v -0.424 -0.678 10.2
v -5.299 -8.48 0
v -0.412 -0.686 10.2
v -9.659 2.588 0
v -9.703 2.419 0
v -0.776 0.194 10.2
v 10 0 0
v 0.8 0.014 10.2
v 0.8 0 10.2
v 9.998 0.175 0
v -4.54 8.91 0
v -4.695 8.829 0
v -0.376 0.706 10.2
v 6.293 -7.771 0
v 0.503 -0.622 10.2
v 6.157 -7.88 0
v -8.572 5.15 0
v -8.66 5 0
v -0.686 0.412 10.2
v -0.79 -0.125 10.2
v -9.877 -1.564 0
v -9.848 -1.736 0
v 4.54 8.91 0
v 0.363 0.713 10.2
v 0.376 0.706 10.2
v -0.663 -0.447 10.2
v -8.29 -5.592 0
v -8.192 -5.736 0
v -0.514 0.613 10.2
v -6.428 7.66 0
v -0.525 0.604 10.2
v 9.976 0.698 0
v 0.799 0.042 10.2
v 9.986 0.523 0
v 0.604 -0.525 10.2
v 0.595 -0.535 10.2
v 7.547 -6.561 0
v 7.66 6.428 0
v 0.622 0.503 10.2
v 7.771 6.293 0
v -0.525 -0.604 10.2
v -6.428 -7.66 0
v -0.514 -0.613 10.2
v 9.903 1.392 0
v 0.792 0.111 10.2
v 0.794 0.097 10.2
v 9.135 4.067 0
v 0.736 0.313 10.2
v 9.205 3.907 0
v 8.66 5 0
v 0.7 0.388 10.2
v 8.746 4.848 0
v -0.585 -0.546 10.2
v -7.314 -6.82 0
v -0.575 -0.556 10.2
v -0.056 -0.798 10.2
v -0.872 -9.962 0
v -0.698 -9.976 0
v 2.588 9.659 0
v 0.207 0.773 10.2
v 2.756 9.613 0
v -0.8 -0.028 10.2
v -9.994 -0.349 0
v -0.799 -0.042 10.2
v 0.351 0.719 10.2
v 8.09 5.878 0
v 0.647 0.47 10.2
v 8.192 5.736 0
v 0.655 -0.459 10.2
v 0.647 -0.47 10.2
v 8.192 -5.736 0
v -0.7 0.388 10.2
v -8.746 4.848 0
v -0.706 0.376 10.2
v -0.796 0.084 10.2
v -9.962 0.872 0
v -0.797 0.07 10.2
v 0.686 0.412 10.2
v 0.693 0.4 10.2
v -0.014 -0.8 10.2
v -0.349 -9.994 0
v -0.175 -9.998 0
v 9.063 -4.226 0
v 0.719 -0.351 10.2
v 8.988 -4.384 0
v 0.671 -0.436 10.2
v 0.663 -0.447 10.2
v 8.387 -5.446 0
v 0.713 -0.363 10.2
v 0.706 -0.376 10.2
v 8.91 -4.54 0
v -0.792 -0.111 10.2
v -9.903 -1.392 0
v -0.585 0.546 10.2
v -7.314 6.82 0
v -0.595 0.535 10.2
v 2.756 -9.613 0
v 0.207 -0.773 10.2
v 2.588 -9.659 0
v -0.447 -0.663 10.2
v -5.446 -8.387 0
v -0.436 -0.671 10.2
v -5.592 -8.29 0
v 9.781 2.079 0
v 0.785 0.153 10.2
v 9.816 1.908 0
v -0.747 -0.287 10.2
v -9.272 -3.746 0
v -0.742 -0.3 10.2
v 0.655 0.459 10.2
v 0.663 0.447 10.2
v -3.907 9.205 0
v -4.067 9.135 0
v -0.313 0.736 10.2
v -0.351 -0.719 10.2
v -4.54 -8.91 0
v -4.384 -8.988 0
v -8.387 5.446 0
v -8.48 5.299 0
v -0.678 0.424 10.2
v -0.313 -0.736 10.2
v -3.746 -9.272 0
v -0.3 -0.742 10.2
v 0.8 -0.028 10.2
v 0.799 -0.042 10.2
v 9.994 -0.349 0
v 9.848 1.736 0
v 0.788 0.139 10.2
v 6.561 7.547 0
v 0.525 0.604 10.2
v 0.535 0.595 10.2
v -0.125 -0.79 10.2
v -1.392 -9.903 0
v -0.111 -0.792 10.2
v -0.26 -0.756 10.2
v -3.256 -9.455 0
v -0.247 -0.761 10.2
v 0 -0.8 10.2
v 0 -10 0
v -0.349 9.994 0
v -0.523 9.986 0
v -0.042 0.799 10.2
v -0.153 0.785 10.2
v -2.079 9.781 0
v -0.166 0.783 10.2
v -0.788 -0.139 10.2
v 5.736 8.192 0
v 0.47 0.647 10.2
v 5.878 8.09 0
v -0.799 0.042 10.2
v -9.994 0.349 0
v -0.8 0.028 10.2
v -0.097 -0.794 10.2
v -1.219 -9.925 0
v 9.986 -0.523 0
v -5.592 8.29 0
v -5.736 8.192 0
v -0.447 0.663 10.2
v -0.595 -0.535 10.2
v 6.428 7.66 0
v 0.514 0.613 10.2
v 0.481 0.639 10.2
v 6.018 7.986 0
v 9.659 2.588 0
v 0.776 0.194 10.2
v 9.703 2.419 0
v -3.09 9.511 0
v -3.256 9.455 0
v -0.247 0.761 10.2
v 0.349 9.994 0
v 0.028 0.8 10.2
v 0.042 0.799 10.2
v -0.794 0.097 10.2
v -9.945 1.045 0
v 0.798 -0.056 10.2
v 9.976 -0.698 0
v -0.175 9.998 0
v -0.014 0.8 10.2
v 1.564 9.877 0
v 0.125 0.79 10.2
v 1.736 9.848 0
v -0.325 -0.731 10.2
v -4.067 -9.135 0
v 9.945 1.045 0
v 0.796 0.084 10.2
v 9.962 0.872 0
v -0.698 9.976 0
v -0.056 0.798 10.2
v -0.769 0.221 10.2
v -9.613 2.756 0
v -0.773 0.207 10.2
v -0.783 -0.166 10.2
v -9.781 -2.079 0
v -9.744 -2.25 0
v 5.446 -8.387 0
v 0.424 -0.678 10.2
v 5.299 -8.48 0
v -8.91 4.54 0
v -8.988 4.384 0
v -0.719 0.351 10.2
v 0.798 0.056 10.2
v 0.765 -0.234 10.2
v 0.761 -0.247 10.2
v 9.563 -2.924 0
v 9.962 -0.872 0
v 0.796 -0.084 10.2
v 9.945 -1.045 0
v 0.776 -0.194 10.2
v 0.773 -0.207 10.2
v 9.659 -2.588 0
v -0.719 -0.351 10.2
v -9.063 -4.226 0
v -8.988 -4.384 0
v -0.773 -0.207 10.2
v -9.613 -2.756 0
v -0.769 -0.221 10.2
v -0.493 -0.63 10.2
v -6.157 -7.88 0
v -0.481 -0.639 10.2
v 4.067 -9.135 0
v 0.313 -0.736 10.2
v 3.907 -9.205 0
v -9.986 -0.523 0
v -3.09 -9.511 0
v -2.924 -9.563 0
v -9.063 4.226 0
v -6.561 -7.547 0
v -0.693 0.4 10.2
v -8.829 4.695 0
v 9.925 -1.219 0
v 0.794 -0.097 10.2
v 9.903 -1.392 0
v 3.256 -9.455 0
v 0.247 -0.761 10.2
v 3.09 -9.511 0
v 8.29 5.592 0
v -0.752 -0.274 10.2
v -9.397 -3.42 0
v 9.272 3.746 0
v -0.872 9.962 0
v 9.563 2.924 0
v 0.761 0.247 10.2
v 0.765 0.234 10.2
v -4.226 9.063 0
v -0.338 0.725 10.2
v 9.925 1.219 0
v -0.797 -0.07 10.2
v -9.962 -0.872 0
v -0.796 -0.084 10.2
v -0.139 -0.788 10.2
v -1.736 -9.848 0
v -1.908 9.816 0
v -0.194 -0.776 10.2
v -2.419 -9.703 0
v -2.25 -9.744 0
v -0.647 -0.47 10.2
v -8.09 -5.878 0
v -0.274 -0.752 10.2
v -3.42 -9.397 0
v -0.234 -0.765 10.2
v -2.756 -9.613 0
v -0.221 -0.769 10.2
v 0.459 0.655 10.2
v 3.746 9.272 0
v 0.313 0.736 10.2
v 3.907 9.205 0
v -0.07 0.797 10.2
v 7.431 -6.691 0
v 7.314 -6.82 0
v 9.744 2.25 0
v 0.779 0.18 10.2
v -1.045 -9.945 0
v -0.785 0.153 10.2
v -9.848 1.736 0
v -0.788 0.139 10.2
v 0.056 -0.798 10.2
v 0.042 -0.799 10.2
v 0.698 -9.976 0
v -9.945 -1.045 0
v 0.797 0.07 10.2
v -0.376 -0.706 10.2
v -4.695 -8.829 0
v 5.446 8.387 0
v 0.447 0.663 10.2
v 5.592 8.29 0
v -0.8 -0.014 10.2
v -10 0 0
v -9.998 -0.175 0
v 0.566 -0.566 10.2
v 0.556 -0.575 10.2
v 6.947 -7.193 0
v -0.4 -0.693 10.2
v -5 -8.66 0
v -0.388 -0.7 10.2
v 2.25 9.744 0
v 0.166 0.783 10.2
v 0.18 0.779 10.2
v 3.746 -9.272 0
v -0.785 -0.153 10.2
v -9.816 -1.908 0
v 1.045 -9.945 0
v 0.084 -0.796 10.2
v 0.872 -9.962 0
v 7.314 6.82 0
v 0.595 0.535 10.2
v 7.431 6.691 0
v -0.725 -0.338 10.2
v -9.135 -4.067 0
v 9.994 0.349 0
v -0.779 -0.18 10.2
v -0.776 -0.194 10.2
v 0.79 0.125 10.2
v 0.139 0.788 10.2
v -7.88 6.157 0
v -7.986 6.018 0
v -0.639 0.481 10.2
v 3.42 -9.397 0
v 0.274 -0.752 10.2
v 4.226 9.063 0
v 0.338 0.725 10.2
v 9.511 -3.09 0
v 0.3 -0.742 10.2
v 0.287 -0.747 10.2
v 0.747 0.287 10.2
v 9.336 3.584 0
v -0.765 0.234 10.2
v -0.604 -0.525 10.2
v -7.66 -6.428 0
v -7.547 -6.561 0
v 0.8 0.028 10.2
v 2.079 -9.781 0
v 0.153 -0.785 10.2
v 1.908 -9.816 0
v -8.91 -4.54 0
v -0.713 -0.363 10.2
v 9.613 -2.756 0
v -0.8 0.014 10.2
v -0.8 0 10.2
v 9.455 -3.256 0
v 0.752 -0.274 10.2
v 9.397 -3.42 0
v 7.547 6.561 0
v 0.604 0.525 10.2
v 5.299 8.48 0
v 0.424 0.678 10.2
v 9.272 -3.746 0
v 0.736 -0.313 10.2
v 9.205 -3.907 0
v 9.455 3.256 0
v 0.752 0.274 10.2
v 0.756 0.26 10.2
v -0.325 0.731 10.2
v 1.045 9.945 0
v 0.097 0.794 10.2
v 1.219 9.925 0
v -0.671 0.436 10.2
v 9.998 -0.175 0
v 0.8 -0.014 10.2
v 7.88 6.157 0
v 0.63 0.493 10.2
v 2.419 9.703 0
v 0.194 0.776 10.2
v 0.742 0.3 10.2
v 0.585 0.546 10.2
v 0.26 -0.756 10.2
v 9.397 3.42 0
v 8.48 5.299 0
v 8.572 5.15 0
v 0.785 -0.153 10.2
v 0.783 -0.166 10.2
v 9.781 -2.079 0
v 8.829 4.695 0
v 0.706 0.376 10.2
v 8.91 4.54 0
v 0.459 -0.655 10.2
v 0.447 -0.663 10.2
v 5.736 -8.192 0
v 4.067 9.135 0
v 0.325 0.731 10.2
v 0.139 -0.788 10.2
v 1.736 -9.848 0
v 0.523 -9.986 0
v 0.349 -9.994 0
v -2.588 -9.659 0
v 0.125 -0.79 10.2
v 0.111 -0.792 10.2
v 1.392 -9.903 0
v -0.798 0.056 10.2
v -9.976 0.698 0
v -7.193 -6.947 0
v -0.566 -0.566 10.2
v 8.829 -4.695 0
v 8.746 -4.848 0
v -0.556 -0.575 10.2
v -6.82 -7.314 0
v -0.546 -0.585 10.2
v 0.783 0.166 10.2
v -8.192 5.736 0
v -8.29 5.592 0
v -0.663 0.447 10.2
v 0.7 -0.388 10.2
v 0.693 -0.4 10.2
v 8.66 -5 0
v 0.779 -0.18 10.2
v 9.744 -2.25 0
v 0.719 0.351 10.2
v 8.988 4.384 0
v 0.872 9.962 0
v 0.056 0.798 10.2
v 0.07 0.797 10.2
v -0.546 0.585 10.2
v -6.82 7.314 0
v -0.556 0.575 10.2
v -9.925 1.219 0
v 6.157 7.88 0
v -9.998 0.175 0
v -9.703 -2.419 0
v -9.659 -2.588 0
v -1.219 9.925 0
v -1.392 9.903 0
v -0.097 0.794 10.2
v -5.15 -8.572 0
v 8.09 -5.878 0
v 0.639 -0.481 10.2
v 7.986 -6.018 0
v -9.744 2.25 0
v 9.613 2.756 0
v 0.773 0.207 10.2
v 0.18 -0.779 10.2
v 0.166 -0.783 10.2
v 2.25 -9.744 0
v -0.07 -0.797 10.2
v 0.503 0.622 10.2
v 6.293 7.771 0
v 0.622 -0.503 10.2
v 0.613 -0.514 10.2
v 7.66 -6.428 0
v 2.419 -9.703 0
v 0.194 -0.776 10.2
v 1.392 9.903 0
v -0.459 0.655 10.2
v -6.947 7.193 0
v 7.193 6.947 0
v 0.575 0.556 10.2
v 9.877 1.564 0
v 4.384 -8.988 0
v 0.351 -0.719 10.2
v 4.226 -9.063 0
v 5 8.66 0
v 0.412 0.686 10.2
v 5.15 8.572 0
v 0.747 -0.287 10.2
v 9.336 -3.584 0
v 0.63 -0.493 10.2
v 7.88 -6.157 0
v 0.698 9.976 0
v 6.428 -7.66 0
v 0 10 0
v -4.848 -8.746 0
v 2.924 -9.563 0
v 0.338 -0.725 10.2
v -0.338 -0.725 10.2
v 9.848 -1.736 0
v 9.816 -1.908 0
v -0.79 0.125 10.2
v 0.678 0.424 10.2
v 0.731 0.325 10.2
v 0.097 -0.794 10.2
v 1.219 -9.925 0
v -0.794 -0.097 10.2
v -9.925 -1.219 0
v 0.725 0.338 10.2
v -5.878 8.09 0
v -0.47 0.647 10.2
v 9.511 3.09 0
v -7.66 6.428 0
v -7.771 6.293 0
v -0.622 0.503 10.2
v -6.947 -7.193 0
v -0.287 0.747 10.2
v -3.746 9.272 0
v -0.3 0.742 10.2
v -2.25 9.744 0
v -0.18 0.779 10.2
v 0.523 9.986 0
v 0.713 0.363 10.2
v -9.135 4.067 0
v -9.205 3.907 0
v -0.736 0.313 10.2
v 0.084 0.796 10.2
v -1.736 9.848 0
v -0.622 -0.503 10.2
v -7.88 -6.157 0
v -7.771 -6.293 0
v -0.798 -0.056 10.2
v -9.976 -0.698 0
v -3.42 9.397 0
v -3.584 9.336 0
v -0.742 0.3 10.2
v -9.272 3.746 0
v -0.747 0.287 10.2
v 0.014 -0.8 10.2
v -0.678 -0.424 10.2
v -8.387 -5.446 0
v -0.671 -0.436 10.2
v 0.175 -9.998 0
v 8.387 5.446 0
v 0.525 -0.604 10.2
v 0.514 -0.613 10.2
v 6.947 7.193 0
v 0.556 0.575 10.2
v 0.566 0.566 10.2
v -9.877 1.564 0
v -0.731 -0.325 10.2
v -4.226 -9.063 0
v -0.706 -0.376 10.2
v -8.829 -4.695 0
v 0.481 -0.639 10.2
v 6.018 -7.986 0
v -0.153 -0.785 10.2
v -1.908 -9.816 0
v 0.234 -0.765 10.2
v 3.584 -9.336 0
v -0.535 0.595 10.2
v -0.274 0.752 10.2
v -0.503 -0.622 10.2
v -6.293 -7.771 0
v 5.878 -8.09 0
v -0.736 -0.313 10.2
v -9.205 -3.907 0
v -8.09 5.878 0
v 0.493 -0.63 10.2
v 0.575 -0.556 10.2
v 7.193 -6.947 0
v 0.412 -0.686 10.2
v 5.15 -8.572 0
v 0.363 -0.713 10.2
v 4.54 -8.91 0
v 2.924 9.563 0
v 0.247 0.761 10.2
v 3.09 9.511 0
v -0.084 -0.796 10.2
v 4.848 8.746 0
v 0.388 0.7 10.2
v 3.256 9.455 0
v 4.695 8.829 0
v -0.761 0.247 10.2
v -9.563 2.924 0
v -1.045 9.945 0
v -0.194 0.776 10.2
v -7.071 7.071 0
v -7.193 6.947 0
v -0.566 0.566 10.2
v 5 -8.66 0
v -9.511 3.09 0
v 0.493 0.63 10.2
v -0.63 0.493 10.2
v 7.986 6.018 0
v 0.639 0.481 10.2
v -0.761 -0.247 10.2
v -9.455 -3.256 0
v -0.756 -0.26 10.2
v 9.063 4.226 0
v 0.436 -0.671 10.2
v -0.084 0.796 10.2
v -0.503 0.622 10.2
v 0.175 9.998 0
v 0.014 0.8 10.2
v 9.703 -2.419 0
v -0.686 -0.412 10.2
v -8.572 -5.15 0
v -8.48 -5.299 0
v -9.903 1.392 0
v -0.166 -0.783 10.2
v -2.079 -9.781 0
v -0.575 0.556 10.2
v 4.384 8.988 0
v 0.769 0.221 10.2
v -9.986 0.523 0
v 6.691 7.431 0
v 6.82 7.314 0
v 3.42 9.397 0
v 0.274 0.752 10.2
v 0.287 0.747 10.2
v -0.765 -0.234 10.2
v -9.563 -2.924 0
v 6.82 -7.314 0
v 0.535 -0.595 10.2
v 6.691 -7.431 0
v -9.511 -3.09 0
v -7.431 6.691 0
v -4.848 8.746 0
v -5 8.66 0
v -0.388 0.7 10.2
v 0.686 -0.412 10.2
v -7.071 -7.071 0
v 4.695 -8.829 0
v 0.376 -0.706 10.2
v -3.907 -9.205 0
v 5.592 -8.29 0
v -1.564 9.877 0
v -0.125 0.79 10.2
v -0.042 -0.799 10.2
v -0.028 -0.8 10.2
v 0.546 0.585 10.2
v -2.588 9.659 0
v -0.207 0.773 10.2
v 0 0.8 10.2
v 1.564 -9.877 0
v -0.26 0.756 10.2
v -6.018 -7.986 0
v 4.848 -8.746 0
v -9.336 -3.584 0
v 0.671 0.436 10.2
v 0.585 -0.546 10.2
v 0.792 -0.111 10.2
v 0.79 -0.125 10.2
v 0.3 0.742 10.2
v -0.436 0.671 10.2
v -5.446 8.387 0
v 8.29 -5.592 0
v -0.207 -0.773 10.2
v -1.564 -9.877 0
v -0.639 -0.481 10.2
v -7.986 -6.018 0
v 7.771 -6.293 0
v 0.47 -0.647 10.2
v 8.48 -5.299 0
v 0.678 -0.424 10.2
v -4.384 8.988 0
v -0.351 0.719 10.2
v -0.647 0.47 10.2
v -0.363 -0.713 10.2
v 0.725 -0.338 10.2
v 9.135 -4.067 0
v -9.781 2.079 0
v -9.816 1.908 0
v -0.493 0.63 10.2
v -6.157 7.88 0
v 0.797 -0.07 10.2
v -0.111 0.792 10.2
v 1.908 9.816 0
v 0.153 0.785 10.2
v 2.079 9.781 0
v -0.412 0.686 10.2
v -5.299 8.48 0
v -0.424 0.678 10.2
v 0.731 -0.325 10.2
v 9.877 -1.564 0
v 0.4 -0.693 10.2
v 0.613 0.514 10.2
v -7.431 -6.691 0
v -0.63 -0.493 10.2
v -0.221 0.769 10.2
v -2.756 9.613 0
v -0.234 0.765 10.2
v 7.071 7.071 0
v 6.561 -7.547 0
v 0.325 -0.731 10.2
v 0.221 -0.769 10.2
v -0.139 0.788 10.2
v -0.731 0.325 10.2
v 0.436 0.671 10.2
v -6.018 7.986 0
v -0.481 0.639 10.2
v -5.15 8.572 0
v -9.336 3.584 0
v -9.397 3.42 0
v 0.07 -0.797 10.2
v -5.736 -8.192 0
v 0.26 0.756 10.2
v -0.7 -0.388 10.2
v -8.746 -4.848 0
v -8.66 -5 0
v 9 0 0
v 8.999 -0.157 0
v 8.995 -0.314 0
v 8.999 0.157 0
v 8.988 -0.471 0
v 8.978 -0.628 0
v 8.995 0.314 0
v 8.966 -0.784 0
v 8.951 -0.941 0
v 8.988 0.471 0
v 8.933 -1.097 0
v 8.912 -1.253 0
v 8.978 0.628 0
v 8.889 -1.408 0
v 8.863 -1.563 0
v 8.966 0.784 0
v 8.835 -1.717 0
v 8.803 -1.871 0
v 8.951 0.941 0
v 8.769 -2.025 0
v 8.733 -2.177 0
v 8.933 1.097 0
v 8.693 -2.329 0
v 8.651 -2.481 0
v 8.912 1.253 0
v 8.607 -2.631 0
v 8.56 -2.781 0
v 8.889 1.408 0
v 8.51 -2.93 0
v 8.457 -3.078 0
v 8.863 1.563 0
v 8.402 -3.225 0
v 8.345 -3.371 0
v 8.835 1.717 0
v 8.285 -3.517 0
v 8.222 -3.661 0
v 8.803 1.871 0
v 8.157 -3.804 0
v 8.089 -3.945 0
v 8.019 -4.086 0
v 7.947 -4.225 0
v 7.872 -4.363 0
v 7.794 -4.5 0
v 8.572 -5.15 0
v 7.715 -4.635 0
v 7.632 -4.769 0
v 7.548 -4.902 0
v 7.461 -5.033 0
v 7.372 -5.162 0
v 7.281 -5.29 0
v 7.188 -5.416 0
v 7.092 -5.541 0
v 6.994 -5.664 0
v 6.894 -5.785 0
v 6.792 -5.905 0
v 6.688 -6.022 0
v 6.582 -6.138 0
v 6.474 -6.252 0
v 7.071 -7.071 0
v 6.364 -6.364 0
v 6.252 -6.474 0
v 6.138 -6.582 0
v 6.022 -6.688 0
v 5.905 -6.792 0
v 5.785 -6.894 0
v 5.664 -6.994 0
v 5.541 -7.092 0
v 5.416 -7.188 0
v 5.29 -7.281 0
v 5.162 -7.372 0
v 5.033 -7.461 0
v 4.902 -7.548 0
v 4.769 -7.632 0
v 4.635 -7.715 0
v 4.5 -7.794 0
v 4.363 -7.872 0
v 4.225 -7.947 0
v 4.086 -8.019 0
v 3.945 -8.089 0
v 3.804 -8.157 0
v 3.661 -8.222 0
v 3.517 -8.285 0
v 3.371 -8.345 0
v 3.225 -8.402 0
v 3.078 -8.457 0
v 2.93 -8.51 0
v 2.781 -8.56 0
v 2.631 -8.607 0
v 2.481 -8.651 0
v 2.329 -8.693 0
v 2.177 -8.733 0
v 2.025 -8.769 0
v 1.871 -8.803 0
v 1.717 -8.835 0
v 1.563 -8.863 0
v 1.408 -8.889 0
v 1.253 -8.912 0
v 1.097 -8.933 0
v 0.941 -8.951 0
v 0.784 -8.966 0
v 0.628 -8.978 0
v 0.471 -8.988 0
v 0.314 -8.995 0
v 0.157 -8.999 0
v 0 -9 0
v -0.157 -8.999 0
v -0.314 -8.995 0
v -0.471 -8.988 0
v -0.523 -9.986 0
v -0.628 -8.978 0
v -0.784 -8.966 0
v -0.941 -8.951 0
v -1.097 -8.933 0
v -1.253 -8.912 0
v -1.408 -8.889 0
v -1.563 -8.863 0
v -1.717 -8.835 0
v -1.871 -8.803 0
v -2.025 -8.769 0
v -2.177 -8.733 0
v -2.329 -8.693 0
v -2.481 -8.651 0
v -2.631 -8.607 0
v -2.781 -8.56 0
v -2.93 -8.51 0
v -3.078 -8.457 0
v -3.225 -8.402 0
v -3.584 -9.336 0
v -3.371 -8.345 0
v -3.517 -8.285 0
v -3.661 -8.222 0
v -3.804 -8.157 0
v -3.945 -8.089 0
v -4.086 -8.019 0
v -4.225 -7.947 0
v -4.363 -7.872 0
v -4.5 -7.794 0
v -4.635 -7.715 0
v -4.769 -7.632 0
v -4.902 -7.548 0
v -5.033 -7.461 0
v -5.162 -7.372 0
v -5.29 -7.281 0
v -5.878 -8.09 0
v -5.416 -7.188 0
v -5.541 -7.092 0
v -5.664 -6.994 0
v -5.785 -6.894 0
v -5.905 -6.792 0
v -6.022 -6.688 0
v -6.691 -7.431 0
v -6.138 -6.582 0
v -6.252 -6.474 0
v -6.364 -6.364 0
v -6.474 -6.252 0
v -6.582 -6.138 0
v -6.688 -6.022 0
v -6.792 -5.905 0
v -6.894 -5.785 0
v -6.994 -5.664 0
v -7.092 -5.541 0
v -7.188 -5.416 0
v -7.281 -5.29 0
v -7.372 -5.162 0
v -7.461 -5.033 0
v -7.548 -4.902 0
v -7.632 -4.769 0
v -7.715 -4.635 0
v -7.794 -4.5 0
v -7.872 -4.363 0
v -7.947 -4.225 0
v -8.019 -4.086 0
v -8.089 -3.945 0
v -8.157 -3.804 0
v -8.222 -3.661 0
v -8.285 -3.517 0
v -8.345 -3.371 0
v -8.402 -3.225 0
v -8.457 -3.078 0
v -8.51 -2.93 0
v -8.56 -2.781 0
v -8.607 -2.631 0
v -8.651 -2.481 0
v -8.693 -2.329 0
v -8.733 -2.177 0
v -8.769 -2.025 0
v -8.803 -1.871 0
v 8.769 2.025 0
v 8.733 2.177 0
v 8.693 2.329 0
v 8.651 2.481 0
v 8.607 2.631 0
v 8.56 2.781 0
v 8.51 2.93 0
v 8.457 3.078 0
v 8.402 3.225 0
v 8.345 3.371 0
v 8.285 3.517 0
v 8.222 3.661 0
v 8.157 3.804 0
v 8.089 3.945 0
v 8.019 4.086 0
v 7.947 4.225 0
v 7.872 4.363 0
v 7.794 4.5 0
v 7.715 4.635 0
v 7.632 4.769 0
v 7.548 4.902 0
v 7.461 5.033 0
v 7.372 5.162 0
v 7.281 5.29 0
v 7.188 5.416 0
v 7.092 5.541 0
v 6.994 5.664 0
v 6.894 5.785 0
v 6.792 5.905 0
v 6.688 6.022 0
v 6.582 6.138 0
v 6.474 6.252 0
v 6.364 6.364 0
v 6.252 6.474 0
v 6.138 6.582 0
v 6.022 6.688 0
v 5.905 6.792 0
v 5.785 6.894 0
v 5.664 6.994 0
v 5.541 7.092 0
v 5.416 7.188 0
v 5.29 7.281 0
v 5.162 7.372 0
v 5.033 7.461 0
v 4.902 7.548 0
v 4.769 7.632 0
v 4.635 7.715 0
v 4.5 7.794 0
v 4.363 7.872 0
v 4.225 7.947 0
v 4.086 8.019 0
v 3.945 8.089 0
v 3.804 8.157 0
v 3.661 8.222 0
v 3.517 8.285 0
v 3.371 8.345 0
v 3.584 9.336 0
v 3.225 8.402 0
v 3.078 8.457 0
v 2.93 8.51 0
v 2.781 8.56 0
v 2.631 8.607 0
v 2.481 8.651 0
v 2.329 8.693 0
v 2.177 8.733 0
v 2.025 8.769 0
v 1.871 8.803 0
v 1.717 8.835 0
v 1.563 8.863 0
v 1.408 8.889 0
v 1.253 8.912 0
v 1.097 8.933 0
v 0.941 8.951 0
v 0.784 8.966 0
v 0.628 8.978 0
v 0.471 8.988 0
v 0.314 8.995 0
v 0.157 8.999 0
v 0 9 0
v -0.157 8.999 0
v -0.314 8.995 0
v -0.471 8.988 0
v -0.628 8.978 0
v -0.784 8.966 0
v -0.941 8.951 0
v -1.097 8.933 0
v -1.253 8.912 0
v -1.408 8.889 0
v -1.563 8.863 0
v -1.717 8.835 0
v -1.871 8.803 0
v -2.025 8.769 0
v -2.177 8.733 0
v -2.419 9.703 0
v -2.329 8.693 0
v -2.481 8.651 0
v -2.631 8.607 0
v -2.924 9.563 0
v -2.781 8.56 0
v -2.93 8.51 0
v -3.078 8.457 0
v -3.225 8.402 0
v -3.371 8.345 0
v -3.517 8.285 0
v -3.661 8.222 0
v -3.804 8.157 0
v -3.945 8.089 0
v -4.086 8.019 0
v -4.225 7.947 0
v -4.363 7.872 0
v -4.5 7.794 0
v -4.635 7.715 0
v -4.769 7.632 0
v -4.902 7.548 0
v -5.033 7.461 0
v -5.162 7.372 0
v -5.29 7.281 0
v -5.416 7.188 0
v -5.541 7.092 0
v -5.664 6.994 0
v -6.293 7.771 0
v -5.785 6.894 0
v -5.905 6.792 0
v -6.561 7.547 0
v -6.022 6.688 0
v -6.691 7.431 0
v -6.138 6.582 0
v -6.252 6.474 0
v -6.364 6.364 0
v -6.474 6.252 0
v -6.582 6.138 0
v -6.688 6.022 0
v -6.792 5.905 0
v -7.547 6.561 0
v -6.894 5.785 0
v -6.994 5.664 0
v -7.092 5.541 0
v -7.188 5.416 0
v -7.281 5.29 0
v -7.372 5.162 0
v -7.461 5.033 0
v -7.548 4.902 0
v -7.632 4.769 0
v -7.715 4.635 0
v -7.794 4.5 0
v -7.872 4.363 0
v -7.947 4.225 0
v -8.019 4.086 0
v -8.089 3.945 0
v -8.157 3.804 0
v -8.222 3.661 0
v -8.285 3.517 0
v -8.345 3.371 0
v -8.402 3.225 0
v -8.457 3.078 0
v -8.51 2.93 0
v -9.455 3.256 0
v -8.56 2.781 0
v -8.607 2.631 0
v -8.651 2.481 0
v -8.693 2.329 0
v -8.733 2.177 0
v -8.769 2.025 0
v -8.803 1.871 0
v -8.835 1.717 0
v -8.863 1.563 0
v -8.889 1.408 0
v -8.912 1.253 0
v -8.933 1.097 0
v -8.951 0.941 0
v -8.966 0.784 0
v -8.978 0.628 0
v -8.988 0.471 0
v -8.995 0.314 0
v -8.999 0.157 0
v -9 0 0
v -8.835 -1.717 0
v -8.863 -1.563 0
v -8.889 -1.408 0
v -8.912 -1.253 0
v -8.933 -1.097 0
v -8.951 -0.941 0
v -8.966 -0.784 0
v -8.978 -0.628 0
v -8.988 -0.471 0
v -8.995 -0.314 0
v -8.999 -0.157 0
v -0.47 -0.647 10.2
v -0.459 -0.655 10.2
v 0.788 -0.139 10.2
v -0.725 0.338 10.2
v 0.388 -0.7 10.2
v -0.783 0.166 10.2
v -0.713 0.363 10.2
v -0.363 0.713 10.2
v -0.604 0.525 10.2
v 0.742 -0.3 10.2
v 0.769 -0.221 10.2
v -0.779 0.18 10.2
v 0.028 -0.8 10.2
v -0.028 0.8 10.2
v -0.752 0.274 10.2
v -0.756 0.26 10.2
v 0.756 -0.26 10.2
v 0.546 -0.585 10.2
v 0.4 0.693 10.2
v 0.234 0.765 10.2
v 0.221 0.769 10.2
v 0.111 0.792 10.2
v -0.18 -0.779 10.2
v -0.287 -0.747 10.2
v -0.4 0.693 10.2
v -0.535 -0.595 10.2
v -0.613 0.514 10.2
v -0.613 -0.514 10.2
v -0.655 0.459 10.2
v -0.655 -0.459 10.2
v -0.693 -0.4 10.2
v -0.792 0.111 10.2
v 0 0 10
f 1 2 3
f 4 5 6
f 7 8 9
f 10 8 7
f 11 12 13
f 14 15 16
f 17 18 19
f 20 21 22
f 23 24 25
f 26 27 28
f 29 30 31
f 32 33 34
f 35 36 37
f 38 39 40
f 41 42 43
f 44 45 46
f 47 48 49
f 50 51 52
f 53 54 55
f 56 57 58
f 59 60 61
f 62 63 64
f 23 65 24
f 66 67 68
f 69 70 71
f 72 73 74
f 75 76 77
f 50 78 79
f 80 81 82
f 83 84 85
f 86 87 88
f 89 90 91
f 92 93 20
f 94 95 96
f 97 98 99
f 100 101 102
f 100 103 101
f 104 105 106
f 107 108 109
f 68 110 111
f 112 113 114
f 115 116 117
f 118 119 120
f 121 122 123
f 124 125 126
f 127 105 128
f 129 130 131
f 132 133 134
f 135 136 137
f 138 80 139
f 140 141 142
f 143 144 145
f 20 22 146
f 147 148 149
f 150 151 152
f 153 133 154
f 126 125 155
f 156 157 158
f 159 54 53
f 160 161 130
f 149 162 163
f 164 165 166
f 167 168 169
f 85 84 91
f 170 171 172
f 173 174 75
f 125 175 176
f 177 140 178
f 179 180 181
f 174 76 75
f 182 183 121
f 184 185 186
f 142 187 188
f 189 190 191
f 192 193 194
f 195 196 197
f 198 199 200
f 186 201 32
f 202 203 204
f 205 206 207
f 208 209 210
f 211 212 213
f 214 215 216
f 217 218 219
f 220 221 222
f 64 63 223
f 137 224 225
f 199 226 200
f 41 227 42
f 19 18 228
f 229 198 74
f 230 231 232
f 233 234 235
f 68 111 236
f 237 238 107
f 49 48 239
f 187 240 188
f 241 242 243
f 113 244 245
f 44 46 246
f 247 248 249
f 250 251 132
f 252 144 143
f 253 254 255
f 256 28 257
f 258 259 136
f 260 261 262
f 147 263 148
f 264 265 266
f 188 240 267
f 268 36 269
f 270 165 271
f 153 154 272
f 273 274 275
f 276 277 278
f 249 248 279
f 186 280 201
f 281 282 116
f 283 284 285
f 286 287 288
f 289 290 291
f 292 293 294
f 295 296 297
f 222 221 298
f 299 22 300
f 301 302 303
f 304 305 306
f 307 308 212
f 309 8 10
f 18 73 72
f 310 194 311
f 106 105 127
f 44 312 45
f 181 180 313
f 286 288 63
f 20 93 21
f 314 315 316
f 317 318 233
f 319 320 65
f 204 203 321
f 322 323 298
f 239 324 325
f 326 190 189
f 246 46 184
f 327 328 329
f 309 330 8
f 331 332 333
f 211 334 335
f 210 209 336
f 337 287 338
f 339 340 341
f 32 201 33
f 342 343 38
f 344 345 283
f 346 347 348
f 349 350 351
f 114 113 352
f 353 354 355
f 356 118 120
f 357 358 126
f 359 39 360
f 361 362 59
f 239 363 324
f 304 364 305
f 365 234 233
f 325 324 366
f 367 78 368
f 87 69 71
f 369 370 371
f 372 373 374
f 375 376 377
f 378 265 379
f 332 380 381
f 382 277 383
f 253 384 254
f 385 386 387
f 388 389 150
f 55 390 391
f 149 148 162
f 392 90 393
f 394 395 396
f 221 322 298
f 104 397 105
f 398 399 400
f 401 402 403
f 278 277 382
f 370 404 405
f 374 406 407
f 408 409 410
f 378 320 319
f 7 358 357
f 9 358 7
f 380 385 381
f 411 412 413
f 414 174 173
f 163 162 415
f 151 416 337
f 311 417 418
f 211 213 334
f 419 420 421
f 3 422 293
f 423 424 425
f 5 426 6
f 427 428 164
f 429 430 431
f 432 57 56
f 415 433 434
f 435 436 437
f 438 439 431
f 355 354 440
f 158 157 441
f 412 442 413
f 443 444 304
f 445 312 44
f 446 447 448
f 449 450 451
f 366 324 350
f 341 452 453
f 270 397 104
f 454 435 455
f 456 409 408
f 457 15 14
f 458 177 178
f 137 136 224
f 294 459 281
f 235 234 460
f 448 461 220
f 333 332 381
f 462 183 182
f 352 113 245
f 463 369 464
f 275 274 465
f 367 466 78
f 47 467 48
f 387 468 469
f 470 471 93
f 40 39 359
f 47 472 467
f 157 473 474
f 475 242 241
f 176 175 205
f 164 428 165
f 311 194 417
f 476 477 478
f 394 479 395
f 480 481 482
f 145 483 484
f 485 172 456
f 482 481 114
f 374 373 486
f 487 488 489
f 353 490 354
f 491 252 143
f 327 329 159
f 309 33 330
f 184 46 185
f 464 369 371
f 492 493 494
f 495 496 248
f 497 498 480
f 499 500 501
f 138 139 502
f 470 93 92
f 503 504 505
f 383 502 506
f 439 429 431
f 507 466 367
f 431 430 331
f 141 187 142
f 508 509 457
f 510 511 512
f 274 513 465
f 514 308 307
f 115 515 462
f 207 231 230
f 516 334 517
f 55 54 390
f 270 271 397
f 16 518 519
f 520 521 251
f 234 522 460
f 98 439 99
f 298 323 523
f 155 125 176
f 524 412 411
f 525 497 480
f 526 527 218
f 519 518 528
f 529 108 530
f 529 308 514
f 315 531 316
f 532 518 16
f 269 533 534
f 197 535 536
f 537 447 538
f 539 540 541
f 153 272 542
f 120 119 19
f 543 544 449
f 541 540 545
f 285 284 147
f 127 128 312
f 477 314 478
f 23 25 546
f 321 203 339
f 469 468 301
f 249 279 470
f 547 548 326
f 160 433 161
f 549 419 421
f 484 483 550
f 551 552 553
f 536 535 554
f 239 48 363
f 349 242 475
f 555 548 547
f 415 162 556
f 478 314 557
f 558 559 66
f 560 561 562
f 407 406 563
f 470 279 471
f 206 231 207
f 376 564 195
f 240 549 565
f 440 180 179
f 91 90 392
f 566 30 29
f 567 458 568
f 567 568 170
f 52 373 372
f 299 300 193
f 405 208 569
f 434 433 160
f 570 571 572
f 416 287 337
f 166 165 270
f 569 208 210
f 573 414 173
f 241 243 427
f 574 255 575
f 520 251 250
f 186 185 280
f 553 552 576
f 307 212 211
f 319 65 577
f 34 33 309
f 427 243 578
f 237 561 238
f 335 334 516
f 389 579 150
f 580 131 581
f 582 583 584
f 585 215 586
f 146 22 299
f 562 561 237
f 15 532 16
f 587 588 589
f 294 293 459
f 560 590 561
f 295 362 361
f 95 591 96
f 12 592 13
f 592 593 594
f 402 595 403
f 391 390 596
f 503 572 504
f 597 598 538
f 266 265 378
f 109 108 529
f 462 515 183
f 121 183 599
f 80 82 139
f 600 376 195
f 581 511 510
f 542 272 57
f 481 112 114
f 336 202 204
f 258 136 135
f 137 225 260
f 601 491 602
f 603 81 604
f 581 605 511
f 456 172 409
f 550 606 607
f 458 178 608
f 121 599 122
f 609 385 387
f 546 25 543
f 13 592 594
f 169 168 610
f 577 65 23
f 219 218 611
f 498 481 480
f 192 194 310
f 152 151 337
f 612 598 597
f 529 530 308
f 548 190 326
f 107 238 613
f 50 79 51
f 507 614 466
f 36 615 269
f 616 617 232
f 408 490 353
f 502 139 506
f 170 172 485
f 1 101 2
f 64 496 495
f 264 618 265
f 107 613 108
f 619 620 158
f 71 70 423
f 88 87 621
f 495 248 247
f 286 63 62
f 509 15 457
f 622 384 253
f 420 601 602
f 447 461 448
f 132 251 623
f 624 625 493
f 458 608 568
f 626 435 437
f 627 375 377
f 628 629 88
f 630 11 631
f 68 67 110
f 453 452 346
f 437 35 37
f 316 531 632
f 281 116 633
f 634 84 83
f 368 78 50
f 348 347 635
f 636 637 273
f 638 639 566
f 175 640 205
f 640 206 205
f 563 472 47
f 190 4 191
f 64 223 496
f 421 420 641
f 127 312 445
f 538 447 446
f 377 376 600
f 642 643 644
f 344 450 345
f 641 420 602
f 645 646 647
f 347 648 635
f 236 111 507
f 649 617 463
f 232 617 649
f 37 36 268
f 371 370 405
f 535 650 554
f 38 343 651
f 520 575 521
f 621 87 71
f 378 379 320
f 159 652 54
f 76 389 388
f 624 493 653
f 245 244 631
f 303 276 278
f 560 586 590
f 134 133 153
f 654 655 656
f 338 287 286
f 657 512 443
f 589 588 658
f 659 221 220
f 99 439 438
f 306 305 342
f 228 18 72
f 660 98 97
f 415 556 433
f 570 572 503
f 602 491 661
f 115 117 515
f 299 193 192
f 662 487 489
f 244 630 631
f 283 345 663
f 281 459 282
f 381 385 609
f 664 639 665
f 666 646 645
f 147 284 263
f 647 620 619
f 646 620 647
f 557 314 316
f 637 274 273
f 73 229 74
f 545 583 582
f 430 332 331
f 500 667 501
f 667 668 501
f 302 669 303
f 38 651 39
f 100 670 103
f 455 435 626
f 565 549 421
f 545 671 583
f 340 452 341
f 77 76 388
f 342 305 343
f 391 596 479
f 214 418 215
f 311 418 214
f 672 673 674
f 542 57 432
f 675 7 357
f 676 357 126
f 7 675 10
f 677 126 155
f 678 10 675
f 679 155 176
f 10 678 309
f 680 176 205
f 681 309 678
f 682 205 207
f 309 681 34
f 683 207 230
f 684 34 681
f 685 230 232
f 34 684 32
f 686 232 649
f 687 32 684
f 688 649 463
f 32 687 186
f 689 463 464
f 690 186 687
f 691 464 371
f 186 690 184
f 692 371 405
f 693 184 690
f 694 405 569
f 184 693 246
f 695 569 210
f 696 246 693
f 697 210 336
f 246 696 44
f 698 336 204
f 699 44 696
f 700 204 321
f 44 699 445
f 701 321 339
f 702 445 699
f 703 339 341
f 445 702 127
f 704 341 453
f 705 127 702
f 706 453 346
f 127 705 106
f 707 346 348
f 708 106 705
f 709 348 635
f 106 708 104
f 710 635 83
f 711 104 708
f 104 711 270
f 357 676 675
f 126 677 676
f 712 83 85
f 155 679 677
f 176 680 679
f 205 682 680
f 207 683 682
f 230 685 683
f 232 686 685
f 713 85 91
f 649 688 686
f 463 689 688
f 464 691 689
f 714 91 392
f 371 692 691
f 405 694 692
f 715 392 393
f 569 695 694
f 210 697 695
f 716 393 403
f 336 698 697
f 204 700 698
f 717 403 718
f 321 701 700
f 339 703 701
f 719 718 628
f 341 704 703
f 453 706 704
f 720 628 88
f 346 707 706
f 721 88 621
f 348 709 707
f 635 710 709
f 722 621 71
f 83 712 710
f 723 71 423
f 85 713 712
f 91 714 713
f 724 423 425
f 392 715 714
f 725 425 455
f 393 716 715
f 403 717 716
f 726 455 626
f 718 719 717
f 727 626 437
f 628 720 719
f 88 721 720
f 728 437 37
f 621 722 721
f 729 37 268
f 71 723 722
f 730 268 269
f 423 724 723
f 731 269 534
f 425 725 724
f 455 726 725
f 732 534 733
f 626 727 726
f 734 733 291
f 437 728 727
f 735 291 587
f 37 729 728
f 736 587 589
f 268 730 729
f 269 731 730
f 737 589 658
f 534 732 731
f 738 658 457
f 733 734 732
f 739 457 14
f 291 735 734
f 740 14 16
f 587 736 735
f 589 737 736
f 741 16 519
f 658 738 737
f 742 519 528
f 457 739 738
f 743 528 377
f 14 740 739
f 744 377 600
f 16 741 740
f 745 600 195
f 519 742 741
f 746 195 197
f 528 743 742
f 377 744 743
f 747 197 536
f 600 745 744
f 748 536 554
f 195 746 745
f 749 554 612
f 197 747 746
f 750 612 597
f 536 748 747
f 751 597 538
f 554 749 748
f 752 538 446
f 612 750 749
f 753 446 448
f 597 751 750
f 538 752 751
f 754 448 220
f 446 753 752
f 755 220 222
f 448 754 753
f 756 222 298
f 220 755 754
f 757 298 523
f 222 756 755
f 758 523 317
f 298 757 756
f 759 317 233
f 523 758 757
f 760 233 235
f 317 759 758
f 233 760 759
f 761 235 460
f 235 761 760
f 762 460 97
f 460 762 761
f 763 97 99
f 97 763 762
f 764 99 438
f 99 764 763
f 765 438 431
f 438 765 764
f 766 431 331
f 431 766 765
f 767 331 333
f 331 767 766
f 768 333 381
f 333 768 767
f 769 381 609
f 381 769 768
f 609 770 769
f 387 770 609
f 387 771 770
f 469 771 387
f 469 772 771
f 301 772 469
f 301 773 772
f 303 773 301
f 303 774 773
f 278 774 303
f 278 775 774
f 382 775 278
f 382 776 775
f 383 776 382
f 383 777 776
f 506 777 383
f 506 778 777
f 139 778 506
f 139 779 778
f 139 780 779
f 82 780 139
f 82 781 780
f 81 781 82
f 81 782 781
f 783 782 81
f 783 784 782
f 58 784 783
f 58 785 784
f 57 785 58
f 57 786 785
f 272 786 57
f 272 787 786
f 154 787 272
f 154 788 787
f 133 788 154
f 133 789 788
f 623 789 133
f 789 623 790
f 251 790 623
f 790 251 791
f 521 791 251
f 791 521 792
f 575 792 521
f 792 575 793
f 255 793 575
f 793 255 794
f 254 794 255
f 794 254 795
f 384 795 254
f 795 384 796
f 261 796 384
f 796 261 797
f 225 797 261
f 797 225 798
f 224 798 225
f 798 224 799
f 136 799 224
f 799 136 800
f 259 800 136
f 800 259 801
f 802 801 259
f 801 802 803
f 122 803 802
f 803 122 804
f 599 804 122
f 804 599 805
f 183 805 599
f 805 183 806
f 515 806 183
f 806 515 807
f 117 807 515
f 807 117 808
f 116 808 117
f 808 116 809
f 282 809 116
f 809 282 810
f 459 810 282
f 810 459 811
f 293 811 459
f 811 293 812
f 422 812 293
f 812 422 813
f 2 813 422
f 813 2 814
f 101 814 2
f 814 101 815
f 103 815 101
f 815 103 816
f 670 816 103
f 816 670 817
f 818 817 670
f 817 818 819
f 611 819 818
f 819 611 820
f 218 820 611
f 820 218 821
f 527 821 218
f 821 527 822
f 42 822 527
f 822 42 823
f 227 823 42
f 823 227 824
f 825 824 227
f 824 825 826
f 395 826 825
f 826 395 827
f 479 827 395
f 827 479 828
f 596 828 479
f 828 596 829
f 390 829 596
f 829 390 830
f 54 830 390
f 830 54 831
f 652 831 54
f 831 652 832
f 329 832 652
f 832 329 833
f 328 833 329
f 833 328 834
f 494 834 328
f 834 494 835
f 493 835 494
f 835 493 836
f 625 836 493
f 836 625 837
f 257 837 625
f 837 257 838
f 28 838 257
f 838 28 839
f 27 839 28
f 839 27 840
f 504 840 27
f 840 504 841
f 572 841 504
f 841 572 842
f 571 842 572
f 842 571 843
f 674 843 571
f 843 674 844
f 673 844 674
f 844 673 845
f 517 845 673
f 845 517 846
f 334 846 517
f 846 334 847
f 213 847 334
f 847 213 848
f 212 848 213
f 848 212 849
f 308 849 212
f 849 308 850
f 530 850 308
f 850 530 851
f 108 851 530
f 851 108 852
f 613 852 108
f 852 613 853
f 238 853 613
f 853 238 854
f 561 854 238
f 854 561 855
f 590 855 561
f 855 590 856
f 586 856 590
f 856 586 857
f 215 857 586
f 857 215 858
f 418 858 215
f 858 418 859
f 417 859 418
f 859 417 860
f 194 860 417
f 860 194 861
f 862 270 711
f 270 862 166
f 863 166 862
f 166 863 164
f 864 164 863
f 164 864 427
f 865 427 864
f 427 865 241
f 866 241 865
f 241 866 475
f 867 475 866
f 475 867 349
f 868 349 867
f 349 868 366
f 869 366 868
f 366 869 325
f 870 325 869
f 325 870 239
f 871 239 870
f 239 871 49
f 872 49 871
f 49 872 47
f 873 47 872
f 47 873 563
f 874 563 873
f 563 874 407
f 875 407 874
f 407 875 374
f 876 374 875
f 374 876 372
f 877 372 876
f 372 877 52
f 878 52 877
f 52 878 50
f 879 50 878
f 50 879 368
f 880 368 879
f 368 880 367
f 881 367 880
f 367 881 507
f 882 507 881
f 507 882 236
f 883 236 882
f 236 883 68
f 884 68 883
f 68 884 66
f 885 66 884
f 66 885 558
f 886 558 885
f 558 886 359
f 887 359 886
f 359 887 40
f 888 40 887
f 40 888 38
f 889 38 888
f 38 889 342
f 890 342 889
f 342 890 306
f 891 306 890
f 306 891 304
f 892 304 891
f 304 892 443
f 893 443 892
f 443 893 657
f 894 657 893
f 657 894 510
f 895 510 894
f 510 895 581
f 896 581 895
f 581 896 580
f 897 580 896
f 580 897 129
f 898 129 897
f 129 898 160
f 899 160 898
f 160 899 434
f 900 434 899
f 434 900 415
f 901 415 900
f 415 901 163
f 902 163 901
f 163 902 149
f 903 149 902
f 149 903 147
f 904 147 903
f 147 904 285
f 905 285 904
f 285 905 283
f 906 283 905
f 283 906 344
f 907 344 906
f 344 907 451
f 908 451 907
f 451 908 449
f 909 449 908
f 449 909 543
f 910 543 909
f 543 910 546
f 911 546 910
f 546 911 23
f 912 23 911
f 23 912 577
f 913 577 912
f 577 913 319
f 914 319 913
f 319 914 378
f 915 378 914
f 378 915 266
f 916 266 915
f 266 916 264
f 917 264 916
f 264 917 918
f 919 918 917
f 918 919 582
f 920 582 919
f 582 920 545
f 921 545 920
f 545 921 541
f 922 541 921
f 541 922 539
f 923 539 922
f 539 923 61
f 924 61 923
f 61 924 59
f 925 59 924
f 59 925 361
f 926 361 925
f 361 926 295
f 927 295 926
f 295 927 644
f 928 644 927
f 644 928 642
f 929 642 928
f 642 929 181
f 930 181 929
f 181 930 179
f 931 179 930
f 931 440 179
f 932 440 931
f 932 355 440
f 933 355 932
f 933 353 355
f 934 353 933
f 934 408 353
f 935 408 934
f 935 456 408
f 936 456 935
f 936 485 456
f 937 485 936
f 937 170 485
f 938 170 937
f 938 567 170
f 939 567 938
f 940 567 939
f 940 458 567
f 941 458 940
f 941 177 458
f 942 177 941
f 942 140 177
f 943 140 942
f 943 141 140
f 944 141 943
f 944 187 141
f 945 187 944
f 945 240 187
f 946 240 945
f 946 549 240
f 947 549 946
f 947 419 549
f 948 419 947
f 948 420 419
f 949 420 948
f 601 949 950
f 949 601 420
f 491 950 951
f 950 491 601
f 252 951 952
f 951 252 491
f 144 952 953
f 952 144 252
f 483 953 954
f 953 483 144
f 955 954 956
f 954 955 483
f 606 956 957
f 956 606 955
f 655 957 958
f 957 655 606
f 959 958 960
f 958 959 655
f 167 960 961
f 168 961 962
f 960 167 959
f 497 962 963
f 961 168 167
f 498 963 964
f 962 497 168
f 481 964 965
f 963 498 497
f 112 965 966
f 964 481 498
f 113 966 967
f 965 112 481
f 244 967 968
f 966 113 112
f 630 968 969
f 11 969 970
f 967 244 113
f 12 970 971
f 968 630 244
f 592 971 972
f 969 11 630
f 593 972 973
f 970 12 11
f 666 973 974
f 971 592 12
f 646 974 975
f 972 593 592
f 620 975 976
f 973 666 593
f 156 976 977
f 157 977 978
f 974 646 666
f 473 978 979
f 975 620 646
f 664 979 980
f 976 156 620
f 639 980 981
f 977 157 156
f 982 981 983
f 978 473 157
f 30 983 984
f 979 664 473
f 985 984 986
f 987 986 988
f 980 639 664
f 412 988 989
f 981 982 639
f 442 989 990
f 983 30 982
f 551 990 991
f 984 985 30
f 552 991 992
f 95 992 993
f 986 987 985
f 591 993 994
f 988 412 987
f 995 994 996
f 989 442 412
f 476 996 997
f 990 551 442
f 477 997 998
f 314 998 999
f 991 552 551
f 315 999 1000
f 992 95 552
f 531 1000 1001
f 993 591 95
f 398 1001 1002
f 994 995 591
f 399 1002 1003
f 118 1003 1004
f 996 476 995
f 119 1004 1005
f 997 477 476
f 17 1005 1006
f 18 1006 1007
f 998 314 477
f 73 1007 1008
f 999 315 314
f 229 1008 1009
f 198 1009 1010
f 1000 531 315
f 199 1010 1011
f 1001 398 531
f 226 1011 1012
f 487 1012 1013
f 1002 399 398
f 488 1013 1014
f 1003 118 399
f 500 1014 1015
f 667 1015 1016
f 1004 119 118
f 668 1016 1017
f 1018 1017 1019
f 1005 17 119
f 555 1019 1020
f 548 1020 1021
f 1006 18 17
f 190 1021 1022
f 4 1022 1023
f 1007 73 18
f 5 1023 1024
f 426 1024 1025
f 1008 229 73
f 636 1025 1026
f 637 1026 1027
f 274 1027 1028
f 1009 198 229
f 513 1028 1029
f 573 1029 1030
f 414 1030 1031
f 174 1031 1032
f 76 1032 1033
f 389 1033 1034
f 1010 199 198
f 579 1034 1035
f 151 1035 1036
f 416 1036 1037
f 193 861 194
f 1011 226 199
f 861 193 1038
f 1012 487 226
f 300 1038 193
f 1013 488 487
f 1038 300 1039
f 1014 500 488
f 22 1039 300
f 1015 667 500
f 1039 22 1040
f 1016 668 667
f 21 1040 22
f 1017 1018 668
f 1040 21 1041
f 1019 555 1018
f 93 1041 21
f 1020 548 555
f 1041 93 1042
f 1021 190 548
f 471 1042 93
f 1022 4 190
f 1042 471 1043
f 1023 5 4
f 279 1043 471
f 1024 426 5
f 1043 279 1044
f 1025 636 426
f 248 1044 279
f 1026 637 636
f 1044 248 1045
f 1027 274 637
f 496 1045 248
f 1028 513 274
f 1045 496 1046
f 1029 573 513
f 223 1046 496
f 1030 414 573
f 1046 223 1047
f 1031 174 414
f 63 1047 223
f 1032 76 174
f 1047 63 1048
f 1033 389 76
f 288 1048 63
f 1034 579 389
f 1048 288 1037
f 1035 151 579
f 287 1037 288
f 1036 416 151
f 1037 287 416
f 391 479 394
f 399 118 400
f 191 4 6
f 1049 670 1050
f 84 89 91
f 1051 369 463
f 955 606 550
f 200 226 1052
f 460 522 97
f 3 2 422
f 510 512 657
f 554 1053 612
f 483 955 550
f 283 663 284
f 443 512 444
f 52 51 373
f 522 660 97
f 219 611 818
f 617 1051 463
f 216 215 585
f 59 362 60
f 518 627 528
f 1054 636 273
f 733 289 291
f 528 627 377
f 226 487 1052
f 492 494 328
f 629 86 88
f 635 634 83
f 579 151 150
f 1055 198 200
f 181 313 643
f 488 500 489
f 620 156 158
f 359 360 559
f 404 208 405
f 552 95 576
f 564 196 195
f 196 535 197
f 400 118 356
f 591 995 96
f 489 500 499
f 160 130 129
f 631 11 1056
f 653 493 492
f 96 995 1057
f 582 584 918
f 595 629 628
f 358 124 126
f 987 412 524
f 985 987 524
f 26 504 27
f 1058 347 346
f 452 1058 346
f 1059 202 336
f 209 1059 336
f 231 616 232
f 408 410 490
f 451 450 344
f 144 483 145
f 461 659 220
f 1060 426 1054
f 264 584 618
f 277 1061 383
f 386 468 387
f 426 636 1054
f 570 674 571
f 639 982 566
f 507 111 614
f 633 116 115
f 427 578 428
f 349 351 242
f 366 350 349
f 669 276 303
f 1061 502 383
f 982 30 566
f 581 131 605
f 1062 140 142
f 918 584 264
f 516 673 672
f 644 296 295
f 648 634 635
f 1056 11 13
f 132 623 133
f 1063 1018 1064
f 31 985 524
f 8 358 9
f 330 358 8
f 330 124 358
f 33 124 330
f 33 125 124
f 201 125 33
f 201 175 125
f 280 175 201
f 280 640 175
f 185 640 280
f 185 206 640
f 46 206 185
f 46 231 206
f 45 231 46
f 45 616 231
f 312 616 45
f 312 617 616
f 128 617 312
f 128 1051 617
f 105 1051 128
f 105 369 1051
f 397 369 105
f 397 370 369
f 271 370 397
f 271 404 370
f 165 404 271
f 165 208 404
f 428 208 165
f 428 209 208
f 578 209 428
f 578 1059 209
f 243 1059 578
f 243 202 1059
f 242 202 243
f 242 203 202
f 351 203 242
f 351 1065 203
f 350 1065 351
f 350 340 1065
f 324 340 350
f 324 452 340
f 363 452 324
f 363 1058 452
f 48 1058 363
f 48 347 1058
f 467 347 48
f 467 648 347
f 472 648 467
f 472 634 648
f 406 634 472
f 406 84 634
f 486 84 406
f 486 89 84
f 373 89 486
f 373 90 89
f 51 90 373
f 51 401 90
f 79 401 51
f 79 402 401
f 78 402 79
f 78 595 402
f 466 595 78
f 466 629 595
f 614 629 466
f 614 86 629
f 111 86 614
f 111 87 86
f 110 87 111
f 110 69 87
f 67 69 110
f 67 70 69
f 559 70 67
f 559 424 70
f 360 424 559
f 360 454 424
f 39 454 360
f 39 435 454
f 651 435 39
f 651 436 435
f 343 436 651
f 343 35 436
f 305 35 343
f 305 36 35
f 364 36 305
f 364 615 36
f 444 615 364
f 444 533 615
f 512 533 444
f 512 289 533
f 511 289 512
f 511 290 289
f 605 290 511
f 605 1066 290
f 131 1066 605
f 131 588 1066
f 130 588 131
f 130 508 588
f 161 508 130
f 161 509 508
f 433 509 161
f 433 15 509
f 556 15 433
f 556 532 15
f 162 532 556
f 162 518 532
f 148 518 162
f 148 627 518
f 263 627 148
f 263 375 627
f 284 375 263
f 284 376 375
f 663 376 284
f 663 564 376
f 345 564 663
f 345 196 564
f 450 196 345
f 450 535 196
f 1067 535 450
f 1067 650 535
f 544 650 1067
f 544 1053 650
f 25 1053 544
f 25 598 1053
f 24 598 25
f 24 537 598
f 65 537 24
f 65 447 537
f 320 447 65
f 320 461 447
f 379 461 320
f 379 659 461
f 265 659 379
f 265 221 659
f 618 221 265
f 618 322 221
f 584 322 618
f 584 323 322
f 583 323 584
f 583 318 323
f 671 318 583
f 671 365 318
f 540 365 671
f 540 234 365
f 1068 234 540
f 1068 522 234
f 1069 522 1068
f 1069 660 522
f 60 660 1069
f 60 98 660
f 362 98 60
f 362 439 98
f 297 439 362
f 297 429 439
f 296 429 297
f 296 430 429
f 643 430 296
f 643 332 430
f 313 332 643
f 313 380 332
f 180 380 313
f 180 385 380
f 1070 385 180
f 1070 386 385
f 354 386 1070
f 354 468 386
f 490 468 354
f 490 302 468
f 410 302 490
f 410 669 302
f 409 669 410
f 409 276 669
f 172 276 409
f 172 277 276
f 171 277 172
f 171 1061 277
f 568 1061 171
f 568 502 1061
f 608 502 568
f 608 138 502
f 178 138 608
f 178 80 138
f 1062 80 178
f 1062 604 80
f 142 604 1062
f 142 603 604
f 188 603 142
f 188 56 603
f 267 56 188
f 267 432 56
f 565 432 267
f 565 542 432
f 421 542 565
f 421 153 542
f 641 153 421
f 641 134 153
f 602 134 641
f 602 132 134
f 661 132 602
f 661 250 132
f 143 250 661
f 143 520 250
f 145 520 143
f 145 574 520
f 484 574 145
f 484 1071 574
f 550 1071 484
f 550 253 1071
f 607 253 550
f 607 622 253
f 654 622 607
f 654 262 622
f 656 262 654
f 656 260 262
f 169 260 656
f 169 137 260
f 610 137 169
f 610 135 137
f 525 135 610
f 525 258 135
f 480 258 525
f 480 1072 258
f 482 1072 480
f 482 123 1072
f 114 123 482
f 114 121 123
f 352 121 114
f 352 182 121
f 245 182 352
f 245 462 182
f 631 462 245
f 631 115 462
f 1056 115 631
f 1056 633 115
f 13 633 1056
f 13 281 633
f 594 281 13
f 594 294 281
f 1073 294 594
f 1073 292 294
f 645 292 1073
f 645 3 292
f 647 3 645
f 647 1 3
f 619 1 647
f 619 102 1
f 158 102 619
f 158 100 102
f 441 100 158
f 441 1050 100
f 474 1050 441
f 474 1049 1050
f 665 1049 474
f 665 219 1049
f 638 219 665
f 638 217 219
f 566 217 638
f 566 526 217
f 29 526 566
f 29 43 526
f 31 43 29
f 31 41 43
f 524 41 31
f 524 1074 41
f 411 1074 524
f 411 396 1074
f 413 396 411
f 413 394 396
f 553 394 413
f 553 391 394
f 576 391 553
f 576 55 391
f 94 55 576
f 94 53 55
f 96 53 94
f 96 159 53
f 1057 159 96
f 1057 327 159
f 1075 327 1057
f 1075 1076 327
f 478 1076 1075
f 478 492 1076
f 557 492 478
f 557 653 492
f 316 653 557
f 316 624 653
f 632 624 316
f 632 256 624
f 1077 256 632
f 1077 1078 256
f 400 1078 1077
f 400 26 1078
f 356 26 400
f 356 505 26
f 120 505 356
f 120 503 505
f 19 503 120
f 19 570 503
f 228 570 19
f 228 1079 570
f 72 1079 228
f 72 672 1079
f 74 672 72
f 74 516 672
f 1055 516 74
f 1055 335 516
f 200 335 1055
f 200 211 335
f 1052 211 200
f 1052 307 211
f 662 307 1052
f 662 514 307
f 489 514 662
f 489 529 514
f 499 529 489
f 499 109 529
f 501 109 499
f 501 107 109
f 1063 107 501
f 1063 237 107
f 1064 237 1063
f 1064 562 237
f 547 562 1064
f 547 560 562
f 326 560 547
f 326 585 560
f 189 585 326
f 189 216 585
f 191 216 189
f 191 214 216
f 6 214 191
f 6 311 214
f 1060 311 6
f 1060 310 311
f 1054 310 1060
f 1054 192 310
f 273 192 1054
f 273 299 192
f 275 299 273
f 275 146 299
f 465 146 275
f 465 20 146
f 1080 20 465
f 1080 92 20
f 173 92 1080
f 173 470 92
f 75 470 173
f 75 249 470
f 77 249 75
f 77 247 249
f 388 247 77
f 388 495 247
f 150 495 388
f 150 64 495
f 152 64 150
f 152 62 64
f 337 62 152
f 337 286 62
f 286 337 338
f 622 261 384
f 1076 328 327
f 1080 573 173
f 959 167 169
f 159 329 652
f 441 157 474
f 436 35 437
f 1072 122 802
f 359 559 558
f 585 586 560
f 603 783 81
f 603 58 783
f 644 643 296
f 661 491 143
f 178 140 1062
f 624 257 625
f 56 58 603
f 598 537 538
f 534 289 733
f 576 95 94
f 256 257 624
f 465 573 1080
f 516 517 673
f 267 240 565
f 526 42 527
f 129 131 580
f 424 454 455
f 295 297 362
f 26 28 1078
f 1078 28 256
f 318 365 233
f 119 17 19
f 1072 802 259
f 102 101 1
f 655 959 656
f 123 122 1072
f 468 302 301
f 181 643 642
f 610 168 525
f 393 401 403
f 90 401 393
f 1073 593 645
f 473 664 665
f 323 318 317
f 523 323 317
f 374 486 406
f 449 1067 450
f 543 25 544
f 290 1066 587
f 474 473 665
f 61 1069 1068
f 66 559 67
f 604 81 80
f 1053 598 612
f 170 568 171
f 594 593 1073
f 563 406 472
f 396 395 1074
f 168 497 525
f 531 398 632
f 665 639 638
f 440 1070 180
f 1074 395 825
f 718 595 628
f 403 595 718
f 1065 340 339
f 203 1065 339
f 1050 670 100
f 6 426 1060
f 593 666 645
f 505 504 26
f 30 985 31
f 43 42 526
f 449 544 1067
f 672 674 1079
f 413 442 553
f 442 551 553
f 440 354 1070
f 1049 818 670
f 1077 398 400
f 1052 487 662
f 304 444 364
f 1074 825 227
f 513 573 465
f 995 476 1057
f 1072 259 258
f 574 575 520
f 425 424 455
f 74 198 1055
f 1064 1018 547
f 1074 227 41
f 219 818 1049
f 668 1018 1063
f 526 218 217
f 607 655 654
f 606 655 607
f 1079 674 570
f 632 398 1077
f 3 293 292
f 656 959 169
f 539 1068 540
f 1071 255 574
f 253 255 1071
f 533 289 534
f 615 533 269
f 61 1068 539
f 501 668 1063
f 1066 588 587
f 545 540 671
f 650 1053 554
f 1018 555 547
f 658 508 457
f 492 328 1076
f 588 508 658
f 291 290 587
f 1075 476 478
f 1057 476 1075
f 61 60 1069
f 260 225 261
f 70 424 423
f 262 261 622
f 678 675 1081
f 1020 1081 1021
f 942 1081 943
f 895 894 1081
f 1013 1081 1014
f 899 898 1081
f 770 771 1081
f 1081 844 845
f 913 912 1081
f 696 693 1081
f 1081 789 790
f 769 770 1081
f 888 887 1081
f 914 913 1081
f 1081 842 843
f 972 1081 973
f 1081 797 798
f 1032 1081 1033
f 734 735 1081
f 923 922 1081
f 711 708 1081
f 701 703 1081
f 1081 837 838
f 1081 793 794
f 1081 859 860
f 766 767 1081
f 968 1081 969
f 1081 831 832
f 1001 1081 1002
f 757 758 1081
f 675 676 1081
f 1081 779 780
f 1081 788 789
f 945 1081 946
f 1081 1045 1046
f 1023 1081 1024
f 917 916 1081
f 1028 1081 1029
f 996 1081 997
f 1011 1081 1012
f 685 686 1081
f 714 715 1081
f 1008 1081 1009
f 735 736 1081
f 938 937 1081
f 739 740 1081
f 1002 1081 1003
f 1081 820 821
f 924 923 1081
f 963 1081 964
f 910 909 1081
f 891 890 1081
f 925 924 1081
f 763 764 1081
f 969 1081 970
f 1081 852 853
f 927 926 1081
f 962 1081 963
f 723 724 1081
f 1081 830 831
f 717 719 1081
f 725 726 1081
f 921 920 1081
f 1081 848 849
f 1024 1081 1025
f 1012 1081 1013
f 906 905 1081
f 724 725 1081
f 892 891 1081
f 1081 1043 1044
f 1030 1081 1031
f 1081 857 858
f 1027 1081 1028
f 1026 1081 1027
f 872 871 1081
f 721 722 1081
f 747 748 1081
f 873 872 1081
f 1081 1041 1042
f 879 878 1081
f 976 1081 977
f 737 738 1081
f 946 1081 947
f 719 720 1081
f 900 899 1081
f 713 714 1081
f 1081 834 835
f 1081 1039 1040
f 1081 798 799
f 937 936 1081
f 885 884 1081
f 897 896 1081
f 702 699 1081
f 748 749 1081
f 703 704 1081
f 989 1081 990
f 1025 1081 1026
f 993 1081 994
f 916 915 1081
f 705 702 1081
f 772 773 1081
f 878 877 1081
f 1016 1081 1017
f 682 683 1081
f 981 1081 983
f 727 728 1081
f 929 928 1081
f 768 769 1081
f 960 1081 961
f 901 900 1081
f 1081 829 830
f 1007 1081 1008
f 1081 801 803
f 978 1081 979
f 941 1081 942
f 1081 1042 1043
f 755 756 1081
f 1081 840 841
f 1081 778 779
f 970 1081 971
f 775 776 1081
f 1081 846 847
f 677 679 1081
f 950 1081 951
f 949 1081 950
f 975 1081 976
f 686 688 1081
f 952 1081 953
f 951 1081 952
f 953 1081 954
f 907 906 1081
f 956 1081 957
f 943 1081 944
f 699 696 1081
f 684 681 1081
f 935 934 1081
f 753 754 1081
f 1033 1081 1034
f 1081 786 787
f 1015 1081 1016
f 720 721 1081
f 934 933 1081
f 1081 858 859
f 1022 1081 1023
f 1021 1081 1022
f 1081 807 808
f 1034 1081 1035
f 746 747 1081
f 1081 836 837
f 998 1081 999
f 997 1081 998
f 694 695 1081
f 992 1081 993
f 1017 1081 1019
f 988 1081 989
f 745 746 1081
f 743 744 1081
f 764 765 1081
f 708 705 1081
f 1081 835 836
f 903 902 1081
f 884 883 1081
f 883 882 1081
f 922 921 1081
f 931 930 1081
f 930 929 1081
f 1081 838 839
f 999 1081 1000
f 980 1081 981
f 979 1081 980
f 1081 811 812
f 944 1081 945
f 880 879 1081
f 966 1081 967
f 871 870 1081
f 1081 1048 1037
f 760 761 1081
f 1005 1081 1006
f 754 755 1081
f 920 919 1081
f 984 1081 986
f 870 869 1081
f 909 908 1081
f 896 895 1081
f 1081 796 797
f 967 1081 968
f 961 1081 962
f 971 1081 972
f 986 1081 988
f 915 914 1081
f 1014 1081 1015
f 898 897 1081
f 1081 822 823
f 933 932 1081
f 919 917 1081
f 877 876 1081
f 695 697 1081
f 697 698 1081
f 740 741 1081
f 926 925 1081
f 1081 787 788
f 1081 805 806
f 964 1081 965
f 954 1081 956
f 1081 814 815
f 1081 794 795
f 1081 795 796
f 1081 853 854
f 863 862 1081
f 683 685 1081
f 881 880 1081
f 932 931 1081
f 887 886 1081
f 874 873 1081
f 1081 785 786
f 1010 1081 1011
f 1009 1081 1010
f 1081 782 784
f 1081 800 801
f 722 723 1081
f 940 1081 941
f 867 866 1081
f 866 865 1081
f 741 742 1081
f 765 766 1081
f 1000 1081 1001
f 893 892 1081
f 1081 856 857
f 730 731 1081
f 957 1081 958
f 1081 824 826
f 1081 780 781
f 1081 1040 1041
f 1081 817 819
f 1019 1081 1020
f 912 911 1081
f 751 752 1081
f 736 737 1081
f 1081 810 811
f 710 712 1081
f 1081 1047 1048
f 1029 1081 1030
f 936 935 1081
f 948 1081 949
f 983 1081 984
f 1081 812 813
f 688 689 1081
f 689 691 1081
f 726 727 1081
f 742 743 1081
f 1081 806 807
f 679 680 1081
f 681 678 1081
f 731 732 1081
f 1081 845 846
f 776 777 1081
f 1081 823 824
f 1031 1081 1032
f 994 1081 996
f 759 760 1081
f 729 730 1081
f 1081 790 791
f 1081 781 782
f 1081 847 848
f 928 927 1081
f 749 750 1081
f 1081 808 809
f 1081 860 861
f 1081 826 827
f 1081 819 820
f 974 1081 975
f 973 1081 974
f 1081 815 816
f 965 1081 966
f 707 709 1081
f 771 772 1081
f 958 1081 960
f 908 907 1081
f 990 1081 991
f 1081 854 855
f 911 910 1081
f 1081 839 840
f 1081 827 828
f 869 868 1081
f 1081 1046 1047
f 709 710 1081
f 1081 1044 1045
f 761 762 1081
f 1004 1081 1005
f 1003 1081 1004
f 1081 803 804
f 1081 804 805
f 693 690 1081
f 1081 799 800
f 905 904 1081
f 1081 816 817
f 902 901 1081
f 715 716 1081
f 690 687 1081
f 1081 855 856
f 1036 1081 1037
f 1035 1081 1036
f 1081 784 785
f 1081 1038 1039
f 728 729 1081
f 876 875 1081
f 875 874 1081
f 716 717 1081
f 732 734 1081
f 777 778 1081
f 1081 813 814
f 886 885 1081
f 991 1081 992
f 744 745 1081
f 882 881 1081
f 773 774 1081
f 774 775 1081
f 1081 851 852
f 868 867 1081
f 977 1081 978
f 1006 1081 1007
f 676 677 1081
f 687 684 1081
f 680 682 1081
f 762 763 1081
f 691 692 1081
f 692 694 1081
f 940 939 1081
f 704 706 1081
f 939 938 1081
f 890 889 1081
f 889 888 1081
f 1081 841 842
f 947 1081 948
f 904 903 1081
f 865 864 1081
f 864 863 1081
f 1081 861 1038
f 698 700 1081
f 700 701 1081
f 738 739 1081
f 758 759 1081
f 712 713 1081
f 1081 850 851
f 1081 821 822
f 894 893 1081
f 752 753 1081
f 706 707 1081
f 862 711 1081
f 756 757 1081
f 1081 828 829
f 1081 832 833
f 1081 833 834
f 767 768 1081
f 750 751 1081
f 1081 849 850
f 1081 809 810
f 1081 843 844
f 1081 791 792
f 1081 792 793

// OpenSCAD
$fn = 36 * 10;
NOZZLE_DIAMETER = 0.8;
LAYER_HEIGHT = 0.36;

BASE_OD = 20;
ANGLE = 45;

BASE_OR = BASE_OD / 2;

height = tan(ANGLE) * BASE_OR;

echo("height:", height);

WALL_LINE_COUNT = 1;
USING_THIN_WALLS = false;

module cone()
{
    cylinder(h = height + (USING_THIN_WALLS ? 0 : 0.2), r1 = BASE_OR, r2 = NOZZLE_DIAMETER);
}

render() difference()
{
    cone();

    // wall_thickness = tan(ANGLE) * NOZZLE_DIAMETER * WALL_LINE_COUNT + (USING_THIN_WALLS ? 0 : 1);
    // echo("wall_thickness:", wall_thickness);
    // translate([ 0, 0, layer_movement ]) cone();

    //  - cos(ANGLE) * layer_movement
    cylinder(h = height, r1 = BASE_OR - NOZZLE_DIAMETER * WALL_LINE_COUNT - (USING_THIN_WALLS ? 0 : 0.2), r2 = 0);
}
// cone();
